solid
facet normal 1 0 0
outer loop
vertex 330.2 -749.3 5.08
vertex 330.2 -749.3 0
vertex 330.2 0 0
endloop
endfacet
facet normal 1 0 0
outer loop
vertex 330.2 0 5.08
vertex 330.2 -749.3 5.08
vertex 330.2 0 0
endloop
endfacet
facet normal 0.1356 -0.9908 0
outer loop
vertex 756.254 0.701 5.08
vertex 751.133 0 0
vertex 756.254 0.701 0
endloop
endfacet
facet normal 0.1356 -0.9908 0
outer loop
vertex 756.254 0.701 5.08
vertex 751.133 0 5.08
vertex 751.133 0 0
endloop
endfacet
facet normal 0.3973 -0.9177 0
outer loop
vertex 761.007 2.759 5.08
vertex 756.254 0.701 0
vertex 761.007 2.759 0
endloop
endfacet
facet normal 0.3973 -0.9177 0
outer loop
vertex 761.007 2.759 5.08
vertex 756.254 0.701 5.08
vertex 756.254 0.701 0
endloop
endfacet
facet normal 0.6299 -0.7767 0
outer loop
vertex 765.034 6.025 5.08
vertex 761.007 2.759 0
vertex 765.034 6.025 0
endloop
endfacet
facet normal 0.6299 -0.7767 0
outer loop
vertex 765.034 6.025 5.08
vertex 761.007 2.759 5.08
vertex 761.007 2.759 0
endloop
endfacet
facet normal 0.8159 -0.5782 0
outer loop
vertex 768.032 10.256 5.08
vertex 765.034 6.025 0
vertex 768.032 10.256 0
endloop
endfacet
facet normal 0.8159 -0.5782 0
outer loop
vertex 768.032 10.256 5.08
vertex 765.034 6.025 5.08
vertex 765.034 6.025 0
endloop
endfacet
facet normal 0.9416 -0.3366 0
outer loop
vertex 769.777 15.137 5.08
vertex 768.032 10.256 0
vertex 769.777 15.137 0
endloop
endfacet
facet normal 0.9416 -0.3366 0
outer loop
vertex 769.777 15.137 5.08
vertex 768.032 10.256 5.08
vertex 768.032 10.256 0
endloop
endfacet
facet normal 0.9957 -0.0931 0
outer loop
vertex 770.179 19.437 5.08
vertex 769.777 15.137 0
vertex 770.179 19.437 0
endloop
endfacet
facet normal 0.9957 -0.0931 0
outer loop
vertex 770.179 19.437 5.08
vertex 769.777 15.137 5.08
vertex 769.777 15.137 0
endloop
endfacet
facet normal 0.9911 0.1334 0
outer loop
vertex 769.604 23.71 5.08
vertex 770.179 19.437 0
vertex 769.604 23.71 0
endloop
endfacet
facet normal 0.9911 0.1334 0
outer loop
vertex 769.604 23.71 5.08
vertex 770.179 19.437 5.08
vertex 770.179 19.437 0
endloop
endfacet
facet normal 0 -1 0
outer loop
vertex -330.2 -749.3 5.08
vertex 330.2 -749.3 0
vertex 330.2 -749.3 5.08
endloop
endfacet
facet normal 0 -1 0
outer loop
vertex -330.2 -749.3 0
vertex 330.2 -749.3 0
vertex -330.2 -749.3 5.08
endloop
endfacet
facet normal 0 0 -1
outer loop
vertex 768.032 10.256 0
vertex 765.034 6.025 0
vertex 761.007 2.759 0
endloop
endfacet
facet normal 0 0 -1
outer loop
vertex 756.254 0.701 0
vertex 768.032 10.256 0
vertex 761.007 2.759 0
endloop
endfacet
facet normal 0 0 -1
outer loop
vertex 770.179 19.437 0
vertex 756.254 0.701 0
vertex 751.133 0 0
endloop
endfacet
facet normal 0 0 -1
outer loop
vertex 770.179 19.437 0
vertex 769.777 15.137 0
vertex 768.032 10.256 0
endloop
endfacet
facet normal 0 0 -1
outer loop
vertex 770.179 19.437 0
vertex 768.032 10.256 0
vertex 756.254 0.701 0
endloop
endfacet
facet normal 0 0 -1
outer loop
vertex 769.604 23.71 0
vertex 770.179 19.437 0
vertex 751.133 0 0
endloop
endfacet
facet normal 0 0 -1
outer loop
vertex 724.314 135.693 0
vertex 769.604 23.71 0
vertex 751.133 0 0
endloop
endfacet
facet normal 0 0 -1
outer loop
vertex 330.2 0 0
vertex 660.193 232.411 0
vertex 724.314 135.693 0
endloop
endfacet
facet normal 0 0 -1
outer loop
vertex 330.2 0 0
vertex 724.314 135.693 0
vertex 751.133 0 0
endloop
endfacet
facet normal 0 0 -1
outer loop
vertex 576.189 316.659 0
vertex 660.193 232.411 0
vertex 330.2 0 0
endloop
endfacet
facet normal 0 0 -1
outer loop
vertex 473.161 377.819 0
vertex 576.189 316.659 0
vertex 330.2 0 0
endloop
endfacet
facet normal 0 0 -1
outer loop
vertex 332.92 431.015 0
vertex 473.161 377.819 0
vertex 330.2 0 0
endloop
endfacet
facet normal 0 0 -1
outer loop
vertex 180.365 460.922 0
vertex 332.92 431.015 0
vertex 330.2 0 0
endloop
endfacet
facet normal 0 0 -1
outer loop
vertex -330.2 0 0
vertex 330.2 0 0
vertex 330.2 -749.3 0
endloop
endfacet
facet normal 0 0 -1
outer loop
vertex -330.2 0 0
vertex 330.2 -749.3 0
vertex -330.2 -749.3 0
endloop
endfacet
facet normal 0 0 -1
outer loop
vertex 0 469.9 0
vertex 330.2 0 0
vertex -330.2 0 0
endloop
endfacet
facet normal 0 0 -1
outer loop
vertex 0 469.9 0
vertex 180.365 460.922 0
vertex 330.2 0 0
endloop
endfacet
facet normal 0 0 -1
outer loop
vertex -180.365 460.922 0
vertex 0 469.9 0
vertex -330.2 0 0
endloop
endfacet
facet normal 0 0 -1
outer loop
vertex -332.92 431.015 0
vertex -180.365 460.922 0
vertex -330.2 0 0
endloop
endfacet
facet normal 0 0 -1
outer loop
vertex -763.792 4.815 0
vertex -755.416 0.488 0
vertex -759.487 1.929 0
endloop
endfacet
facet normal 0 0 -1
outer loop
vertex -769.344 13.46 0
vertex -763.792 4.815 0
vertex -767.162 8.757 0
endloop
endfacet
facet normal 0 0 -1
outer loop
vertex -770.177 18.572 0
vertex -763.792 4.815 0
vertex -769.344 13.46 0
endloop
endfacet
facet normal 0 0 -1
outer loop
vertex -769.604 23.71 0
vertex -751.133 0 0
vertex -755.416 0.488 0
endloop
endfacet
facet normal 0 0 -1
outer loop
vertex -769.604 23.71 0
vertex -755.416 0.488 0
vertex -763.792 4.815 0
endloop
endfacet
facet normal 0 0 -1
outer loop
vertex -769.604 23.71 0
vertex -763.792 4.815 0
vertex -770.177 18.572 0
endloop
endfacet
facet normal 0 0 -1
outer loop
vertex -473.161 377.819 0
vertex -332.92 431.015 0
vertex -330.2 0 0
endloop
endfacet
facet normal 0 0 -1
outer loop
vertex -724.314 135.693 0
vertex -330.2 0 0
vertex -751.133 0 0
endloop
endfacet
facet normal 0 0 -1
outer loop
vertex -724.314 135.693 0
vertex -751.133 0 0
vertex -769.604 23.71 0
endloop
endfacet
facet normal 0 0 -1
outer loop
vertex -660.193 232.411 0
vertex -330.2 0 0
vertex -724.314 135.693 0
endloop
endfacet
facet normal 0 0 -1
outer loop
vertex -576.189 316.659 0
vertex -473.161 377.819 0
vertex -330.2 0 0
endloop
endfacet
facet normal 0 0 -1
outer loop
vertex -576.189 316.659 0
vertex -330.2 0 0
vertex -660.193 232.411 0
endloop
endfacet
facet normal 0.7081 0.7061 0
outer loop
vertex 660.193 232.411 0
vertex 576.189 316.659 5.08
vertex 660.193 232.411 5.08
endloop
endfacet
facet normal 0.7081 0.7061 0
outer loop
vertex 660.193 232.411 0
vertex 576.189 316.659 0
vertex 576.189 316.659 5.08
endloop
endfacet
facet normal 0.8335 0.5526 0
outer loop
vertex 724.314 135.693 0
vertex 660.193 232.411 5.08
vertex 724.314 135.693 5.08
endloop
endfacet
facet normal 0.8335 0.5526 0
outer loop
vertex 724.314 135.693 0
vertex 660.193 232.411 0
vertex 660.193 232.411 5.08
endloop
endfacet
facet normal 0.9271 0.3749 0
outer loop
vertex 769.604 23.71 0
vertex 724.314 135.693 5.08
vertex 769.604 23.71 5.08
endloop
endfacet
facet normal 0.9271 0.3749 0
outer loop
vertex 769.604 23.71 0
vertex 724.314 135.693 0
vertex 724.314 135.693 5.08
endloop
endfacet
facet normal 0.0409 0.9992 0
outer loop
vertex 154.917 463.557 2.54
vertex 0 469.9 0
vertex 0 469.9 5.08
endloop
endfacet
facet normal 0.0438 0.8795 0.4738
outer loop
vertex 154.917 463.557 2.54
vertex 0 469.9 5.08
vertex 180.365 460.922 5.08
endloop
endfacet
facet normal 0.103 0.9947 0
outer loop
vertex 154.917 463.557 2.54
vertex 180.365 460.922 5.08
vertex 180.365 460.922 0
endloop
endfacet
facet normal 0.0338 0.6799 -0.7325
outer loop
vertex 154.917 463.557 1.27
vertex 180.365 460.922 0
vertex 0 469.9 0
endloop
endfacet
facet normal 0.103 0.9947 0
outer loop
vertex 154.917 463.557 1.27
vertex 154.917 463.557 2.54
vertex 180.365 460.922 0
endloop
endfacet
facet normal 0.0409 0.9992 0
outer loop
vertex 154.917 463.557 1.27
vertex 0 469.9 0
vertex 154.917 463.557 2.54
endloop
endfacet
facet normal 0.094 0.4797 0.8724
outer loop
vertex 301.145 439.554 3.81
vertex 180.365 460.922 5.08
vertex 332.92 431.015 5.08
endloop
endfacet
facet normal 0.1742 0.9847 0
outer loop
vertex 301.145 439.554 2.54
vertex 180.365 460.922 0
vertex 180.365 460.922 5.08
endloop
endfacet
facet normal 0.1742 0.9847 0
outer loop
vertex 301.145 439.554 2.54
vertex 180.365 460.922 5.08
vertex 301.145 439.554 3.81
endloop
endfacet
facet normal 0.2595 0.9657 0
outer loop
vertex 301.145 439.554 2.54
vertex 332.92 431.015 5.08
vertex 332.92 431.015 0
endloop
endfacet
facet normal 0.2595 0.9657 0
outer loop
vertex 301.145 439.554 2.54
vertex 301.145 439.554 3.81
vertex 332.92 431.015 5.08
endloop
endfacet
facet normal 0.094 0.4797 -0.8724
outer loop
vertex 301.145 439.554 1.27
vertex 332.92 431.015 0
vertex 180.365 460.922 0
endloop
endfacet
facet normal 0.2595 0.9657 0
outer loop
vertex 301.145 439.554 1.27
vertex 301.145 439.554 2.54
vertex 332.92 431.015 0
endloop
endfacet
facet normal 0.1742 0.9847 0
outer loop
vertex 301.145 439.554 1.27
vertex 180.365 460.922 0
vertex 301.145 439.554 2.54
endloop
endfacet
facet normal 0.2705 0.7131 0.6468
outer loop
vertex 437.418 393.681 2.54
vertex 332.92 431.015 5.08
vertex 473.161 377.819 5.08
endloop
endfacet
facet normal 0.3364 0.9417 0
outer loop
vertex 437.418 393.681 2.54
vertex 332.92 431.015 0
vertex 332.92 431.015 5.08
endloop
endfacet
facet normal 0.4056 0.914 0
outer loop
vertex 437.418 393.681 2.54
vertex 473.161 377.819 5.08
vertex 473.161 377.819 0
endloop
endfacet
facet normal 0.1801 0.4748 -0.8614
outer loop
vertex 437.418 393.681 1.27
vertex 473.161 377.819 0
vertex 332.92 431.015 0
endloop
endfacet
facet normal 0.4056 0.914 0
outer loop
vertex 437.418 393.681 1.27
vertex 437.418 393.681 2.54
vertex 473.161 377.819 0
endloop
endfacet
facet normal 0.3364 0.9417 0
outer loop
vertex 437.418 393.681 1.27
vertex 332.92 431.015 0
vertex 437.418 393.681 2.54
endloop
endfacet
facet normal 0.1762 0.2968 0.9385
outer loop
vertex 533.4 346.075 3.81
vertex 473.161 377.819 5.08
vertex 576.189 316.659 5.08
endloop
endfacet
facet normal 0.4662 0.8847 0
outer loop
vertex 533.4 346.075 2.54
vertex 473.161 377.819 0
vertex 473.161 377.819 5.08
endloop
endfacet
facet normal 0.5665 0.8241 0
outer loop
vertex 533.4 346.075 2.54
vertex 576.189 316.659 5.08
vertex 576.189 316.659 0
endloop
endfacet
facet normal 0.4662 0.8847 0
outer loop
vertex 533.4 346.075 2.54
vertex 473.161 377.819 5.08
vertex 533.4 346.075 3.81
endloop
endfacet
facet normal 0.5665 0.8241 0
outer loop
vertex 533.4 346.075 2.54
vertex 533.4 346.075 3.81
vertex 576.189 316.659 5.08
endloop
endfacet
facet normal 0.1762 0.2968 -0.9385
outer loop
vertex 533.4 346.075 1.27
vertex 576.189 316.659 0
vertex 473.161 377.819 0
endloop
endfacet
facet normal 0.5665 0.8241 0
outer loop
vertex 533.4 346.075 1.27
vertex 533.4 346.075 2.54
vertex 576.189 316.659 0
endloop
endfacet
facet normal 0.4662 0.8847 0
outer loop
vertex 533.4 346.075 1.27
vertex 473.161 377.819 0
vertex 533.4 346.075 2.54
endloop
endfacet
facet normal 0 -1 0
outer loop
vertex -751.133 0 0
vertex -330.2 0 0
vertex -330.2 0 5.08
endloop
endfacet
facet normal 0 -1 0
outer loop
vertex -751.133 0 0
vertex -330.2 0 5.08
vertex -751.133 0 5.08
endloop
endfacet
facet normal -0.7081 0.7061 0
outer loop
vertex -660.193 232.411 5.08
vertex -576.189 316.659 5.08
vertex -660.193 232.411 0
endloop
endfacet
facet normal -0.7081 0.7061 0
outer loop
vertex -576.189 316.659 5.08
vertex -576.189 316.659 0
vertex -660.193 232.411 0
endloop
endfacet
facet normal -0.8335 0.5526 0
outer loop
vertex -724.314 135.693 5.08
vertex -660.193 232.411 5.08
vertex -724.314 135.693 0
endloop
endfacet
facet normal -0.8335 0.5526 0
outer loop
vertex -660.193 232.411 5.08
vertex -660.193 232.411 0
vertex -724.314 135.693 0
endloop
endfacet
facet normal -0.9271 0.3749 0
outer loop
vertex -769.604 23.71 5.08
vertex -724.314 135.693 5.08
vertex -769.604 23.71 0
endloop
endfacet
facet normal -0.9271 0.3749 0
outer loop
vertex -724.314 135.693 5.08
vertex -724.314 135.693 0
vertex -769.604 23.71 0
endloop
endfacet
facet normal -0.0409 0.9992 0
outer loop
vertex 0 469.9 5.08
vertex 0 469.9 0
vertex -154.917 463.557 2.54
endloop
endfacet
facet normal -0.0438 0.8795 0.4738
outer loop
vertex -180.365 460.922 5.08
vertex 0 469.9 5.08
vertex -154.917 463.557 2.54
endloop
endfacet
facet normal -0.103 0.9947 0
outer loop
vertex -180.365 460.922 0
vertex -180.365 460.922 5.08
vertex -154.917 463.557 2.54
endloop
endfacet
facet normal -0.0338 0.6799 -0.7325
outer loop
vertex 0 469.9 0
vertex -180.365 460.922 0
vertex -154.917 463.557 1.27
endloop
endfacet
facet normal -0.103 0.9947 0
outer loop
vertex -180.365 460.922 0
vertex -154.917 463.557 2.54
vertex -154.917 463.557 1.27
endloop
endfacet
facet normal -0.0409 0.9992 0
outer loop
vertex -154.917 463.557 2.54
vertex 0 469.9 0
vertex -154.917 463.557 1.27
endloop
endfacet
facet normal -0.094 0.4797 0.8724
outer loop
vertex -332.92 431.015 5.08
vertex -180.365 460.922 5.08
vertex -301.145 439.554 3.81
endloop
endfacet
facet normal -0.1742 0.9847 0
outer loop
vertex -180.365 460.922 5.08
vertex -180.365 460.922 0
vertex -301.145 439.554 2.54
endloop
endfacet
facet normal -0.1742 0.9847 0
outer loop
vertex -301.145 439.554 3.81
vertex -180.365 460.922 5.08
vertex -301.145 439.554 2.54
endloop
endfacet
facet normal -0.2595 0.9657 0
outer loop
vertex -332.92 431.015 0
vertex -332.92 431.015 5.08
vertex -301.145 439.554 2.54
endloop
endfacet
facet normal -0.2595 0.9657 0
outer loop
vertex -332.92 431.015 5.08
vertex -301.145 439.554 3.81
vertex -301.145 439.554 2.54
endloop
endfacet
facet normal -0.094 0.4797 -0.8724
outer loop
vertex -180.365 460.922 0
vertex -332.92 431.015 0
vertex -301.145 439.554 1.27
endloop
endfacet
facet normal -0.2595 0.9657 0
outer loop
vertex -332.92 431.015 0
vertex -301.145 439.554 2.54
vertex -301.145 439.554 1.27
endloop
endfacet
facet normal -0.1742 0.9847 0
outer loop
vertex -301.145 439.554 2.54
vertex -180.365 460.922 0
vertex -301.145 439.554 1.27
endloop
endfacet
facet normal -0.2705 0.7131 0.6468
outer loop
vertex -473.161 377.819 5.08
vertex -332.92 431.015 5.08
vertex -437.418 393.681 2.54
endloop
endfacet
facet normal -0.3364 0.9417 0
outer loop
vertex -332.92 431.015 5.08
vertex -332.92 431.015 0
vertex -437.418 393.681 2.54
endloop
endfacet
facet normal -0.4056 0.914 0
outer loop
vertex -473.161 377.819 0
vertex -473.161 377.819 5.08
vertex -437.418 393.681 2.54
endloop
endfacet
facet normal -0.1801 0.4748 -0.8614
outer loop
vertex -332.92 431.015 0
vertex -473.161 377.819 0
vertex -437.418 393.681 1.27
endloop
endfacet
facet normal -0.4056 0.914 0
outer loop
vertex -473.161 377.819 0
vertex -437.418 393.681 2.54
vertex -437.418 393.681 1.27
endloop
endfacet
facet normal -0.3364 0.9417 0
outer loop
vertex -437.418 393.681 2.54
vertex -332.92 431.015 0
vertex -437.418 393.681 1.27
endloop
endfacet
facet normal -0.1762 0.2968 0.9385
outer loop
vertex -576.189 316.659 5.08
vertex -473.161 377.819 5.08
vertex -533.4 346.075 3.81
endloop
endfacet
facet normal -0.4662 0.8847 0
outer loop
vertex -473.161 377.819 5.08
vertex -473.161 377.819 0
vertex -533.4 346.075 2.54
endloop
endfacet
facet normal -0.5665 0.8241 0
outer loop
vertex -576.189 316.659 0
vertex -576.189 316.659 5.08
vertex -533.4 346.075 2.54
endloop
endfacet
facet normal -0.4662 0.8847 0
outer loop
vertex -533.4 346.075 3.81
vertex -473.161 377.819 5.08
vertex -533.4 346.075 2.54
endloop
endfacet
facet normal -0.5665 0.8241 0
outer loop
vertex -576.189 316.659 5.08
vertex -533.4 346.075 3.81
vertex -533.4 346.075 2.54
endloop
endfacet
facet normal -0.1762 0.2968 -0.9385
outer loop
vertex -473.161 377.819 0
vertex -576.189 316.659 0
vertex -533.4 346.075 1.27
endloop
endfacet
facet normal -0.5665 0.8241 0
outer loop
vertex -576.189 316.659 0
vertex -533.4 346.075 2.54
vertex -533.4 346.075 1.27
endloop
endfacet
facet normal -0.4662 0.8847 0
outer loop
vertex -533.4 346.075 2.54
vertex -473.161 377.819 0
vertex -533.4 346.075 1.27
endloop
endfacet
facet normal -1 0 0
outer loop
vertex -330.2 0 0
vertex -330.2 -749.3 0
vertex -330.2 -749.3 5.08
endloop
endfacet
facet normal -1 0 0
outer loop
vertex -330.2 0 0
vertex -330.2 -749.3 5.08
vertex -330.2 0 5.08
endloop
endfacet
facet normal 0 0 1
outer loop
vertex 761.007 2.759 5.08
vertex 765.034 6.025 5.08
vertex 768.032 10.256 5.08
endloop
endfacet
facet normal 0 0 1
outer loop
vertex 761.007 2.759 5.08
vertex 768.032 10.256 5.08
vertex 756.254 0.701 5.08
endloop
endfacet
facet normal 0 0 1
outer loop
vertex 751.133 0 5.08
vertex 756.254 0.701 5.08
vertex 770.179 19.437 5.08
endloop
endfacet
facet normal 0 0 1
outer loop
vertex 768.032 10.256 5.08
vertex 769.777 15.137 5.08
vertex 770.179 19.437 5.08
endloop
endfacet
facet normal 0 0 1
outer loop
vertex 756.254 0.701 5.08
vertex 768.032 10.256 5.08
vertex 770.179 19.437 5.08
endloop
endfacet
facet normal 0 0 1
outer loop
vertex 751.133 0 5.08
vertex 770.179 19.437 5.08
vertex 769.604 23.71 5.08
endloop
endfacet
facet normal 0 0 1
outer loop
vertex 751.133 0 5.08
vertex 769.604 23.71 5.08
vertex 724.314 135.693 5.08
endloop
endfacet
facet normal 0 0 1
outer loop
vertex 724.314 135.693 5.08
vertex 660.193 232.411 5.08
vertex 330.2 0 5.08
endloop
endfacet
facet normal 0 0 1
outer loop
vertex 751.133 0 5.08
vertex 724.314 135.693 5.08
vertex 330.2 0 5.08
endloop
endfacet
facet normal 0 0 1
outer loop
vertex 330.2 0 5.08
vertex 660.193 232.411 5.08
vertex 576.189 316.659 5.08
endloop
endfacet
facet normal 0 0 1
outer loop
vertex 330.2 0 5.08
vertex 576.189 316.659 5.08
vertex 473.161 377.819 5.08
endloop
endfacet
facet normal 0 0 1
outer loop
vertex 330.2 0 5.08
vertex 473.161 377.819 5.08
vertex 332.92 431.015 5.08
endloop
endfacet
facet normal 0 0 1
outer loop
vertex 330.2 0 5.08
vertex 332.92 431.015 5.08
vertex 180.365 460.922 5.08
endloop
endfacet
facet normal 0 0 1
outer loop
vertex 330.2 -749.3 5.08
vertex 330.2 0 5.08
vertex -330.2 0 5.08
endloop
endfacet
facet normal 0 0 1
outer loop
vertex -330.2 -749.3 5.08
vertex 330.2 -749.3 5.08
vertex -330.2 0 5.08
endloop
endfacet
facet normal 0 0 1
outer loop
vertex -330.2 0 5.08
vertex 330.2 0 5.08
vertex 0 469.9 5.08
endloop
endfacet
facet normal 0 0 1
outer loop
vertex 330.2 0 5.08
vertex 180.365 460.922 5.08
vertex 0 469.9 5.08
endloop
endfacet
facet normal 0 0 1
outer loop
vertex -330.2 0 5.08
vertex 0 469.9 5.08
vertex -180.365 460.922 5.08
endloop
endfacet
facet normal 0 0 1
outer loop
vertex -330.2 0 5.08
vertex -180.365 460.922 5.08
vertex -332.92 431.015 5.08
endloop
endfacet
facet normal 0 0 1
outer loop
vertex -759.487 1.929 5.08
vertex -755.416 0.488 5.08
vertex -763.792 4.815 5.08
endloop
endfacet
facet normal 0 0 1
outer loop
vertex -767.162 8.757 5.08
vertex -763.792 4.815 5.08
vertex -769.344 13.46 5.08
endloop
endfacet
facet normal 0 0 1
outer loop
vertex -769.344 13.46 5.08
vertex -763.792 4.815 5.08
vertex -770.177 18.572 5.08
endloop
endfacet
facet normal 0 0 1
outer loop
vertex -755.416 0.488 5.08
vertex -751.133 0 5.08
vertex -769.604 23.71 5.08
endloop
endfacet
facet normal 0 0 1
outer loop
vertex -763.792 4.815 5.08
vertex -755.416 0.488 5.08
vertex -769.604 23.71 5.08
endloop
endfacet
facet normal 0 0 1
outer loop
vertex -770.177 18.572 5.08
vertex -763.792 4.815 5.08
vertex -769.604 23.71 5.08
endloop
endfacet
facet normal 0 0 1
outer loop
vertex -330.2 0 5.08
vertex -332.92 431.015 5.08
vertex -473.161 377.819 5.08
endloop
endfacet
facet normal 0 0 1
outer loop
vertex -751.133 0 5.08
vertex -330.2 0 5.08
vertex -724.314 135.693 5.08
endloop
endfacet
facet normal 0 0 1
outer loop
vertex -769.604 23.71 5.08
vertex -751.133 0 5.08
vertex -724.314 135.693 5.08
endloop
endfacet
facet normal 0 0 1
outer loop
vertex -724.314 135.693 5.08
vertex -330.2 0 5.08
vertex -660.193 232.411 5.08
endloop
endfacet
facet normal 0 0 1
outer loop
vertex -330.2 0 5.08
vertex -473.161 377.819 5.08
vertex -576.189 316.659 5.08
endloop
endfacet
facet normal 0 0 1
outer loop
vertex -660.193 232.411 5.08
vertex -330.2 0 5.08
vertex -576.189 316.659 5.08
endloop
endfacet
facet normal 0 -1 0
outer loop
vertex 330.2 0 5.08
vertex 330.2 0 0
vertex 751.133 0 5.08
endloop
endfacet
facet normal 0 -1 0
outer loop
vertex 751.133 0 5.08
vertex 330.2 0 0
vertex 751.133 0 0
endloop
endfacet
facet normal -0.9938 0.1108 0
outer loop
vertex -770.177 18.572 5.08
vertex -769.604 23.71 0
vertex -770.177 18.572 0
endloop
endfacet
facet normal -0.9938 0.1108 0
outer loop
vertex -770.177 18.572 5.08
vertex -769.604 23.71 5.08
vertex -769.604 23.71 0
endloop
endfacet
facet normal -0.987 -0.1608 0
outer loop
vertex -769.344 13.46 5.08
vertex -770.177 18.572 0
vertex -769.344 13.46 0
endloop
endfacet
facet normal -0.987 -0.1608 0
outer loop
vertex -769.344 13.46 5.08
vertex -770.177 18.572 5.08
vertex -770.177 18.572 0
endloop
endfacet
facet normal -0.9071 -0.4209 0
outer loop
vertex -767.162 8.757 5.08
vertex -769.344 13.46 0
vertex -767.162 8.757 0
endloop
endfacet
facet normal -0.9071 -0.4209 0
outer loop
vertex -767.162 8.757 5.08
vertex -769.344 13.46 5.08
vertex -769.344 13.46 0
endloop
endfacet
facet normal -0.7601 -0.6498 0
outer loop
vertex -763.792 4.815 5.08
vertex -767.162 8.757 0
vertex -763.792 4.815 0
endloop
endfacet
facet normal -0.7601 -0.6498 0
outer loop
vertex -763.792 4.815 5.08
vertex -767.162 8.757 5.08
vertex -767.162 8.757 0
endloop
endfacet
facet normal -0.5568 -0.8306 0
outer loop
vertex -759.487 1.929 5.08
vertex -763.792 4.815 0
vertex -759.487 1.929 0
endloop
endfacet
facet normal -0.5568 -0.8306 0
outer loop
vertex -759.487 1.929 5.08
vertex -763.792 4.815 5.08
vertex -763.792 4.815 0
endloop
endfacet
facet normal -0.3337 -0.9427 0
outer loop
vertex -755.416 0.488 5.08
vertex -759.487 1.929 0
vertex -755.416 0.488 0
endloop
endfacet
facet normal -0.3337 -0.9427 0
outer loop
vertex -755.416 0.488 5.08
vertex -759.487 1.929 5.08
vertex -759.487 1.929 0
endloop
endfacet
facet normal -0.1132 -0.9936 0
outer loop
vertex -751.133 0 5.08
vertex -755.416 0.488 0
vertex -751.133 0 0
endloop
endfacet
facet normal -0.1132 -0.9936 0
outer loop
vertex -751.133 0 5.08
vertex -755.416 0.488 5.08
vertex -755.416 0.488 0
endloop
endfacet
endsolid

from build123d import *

# Parameters (mm, degrees)
F1_DEPTH = 5.08
F3_R     = 19.05


with BuildPart() as f1:
    # F0 (on Top) → F1 (new body)
    with BuildSketch(Plane.XY):
        with BuildLine():
            Line((330.2, -749.3), (330.2, 0))
            Line((330.2, 0), (774.7, 0))
            add(Edge.make_bspline(
                [(533.4, 346.075), (573.7217347806, 321.0394014687), (657.0955955977, 255.5096820003), (758.6746607985, 90.8842148666), (774.7, 0)],
                knots=[0, 0, 0, 0, 0.4240239998, 1, 1, 1, 1], degree=3))
            add(Edge.make_bspline(
                [(0, 469.9), (117.6640682839, 469.9), (314.566634033, 454.9110276808), (496.6869354248, 368.8699901104), (533.4, 346.075)],
                knots=[0, 0, 0, 0, 0.5510985779, 1, 1, 1, 1], degree=3))
            Line((0, 469.9), (0, 0))
            Line((0, 0), (0, -749.3))
            Line((0, -749.3), (330.2, -749.3))
        make_face()
    extrude(amount=F1_DEPTH)

    # F2: F1 across face


with BuildPart() as f1_1:
    add(f1.part)
    add(f1.part.mirror(Plane(origin=(0, -139.7, 2.54), x_dir=(0, -1, 0), z_dir=(-1, 0, 0))))

    # F3
    f3_edges = [f1_1.edges().sort_by_distance(p)[0] for p in [
        (774.7, 0, 2.54),
        (-774.7, 0, 2.54),
    ]]
    fillet(f3_edges, radius=F3_R)


solid = f1_1.part
